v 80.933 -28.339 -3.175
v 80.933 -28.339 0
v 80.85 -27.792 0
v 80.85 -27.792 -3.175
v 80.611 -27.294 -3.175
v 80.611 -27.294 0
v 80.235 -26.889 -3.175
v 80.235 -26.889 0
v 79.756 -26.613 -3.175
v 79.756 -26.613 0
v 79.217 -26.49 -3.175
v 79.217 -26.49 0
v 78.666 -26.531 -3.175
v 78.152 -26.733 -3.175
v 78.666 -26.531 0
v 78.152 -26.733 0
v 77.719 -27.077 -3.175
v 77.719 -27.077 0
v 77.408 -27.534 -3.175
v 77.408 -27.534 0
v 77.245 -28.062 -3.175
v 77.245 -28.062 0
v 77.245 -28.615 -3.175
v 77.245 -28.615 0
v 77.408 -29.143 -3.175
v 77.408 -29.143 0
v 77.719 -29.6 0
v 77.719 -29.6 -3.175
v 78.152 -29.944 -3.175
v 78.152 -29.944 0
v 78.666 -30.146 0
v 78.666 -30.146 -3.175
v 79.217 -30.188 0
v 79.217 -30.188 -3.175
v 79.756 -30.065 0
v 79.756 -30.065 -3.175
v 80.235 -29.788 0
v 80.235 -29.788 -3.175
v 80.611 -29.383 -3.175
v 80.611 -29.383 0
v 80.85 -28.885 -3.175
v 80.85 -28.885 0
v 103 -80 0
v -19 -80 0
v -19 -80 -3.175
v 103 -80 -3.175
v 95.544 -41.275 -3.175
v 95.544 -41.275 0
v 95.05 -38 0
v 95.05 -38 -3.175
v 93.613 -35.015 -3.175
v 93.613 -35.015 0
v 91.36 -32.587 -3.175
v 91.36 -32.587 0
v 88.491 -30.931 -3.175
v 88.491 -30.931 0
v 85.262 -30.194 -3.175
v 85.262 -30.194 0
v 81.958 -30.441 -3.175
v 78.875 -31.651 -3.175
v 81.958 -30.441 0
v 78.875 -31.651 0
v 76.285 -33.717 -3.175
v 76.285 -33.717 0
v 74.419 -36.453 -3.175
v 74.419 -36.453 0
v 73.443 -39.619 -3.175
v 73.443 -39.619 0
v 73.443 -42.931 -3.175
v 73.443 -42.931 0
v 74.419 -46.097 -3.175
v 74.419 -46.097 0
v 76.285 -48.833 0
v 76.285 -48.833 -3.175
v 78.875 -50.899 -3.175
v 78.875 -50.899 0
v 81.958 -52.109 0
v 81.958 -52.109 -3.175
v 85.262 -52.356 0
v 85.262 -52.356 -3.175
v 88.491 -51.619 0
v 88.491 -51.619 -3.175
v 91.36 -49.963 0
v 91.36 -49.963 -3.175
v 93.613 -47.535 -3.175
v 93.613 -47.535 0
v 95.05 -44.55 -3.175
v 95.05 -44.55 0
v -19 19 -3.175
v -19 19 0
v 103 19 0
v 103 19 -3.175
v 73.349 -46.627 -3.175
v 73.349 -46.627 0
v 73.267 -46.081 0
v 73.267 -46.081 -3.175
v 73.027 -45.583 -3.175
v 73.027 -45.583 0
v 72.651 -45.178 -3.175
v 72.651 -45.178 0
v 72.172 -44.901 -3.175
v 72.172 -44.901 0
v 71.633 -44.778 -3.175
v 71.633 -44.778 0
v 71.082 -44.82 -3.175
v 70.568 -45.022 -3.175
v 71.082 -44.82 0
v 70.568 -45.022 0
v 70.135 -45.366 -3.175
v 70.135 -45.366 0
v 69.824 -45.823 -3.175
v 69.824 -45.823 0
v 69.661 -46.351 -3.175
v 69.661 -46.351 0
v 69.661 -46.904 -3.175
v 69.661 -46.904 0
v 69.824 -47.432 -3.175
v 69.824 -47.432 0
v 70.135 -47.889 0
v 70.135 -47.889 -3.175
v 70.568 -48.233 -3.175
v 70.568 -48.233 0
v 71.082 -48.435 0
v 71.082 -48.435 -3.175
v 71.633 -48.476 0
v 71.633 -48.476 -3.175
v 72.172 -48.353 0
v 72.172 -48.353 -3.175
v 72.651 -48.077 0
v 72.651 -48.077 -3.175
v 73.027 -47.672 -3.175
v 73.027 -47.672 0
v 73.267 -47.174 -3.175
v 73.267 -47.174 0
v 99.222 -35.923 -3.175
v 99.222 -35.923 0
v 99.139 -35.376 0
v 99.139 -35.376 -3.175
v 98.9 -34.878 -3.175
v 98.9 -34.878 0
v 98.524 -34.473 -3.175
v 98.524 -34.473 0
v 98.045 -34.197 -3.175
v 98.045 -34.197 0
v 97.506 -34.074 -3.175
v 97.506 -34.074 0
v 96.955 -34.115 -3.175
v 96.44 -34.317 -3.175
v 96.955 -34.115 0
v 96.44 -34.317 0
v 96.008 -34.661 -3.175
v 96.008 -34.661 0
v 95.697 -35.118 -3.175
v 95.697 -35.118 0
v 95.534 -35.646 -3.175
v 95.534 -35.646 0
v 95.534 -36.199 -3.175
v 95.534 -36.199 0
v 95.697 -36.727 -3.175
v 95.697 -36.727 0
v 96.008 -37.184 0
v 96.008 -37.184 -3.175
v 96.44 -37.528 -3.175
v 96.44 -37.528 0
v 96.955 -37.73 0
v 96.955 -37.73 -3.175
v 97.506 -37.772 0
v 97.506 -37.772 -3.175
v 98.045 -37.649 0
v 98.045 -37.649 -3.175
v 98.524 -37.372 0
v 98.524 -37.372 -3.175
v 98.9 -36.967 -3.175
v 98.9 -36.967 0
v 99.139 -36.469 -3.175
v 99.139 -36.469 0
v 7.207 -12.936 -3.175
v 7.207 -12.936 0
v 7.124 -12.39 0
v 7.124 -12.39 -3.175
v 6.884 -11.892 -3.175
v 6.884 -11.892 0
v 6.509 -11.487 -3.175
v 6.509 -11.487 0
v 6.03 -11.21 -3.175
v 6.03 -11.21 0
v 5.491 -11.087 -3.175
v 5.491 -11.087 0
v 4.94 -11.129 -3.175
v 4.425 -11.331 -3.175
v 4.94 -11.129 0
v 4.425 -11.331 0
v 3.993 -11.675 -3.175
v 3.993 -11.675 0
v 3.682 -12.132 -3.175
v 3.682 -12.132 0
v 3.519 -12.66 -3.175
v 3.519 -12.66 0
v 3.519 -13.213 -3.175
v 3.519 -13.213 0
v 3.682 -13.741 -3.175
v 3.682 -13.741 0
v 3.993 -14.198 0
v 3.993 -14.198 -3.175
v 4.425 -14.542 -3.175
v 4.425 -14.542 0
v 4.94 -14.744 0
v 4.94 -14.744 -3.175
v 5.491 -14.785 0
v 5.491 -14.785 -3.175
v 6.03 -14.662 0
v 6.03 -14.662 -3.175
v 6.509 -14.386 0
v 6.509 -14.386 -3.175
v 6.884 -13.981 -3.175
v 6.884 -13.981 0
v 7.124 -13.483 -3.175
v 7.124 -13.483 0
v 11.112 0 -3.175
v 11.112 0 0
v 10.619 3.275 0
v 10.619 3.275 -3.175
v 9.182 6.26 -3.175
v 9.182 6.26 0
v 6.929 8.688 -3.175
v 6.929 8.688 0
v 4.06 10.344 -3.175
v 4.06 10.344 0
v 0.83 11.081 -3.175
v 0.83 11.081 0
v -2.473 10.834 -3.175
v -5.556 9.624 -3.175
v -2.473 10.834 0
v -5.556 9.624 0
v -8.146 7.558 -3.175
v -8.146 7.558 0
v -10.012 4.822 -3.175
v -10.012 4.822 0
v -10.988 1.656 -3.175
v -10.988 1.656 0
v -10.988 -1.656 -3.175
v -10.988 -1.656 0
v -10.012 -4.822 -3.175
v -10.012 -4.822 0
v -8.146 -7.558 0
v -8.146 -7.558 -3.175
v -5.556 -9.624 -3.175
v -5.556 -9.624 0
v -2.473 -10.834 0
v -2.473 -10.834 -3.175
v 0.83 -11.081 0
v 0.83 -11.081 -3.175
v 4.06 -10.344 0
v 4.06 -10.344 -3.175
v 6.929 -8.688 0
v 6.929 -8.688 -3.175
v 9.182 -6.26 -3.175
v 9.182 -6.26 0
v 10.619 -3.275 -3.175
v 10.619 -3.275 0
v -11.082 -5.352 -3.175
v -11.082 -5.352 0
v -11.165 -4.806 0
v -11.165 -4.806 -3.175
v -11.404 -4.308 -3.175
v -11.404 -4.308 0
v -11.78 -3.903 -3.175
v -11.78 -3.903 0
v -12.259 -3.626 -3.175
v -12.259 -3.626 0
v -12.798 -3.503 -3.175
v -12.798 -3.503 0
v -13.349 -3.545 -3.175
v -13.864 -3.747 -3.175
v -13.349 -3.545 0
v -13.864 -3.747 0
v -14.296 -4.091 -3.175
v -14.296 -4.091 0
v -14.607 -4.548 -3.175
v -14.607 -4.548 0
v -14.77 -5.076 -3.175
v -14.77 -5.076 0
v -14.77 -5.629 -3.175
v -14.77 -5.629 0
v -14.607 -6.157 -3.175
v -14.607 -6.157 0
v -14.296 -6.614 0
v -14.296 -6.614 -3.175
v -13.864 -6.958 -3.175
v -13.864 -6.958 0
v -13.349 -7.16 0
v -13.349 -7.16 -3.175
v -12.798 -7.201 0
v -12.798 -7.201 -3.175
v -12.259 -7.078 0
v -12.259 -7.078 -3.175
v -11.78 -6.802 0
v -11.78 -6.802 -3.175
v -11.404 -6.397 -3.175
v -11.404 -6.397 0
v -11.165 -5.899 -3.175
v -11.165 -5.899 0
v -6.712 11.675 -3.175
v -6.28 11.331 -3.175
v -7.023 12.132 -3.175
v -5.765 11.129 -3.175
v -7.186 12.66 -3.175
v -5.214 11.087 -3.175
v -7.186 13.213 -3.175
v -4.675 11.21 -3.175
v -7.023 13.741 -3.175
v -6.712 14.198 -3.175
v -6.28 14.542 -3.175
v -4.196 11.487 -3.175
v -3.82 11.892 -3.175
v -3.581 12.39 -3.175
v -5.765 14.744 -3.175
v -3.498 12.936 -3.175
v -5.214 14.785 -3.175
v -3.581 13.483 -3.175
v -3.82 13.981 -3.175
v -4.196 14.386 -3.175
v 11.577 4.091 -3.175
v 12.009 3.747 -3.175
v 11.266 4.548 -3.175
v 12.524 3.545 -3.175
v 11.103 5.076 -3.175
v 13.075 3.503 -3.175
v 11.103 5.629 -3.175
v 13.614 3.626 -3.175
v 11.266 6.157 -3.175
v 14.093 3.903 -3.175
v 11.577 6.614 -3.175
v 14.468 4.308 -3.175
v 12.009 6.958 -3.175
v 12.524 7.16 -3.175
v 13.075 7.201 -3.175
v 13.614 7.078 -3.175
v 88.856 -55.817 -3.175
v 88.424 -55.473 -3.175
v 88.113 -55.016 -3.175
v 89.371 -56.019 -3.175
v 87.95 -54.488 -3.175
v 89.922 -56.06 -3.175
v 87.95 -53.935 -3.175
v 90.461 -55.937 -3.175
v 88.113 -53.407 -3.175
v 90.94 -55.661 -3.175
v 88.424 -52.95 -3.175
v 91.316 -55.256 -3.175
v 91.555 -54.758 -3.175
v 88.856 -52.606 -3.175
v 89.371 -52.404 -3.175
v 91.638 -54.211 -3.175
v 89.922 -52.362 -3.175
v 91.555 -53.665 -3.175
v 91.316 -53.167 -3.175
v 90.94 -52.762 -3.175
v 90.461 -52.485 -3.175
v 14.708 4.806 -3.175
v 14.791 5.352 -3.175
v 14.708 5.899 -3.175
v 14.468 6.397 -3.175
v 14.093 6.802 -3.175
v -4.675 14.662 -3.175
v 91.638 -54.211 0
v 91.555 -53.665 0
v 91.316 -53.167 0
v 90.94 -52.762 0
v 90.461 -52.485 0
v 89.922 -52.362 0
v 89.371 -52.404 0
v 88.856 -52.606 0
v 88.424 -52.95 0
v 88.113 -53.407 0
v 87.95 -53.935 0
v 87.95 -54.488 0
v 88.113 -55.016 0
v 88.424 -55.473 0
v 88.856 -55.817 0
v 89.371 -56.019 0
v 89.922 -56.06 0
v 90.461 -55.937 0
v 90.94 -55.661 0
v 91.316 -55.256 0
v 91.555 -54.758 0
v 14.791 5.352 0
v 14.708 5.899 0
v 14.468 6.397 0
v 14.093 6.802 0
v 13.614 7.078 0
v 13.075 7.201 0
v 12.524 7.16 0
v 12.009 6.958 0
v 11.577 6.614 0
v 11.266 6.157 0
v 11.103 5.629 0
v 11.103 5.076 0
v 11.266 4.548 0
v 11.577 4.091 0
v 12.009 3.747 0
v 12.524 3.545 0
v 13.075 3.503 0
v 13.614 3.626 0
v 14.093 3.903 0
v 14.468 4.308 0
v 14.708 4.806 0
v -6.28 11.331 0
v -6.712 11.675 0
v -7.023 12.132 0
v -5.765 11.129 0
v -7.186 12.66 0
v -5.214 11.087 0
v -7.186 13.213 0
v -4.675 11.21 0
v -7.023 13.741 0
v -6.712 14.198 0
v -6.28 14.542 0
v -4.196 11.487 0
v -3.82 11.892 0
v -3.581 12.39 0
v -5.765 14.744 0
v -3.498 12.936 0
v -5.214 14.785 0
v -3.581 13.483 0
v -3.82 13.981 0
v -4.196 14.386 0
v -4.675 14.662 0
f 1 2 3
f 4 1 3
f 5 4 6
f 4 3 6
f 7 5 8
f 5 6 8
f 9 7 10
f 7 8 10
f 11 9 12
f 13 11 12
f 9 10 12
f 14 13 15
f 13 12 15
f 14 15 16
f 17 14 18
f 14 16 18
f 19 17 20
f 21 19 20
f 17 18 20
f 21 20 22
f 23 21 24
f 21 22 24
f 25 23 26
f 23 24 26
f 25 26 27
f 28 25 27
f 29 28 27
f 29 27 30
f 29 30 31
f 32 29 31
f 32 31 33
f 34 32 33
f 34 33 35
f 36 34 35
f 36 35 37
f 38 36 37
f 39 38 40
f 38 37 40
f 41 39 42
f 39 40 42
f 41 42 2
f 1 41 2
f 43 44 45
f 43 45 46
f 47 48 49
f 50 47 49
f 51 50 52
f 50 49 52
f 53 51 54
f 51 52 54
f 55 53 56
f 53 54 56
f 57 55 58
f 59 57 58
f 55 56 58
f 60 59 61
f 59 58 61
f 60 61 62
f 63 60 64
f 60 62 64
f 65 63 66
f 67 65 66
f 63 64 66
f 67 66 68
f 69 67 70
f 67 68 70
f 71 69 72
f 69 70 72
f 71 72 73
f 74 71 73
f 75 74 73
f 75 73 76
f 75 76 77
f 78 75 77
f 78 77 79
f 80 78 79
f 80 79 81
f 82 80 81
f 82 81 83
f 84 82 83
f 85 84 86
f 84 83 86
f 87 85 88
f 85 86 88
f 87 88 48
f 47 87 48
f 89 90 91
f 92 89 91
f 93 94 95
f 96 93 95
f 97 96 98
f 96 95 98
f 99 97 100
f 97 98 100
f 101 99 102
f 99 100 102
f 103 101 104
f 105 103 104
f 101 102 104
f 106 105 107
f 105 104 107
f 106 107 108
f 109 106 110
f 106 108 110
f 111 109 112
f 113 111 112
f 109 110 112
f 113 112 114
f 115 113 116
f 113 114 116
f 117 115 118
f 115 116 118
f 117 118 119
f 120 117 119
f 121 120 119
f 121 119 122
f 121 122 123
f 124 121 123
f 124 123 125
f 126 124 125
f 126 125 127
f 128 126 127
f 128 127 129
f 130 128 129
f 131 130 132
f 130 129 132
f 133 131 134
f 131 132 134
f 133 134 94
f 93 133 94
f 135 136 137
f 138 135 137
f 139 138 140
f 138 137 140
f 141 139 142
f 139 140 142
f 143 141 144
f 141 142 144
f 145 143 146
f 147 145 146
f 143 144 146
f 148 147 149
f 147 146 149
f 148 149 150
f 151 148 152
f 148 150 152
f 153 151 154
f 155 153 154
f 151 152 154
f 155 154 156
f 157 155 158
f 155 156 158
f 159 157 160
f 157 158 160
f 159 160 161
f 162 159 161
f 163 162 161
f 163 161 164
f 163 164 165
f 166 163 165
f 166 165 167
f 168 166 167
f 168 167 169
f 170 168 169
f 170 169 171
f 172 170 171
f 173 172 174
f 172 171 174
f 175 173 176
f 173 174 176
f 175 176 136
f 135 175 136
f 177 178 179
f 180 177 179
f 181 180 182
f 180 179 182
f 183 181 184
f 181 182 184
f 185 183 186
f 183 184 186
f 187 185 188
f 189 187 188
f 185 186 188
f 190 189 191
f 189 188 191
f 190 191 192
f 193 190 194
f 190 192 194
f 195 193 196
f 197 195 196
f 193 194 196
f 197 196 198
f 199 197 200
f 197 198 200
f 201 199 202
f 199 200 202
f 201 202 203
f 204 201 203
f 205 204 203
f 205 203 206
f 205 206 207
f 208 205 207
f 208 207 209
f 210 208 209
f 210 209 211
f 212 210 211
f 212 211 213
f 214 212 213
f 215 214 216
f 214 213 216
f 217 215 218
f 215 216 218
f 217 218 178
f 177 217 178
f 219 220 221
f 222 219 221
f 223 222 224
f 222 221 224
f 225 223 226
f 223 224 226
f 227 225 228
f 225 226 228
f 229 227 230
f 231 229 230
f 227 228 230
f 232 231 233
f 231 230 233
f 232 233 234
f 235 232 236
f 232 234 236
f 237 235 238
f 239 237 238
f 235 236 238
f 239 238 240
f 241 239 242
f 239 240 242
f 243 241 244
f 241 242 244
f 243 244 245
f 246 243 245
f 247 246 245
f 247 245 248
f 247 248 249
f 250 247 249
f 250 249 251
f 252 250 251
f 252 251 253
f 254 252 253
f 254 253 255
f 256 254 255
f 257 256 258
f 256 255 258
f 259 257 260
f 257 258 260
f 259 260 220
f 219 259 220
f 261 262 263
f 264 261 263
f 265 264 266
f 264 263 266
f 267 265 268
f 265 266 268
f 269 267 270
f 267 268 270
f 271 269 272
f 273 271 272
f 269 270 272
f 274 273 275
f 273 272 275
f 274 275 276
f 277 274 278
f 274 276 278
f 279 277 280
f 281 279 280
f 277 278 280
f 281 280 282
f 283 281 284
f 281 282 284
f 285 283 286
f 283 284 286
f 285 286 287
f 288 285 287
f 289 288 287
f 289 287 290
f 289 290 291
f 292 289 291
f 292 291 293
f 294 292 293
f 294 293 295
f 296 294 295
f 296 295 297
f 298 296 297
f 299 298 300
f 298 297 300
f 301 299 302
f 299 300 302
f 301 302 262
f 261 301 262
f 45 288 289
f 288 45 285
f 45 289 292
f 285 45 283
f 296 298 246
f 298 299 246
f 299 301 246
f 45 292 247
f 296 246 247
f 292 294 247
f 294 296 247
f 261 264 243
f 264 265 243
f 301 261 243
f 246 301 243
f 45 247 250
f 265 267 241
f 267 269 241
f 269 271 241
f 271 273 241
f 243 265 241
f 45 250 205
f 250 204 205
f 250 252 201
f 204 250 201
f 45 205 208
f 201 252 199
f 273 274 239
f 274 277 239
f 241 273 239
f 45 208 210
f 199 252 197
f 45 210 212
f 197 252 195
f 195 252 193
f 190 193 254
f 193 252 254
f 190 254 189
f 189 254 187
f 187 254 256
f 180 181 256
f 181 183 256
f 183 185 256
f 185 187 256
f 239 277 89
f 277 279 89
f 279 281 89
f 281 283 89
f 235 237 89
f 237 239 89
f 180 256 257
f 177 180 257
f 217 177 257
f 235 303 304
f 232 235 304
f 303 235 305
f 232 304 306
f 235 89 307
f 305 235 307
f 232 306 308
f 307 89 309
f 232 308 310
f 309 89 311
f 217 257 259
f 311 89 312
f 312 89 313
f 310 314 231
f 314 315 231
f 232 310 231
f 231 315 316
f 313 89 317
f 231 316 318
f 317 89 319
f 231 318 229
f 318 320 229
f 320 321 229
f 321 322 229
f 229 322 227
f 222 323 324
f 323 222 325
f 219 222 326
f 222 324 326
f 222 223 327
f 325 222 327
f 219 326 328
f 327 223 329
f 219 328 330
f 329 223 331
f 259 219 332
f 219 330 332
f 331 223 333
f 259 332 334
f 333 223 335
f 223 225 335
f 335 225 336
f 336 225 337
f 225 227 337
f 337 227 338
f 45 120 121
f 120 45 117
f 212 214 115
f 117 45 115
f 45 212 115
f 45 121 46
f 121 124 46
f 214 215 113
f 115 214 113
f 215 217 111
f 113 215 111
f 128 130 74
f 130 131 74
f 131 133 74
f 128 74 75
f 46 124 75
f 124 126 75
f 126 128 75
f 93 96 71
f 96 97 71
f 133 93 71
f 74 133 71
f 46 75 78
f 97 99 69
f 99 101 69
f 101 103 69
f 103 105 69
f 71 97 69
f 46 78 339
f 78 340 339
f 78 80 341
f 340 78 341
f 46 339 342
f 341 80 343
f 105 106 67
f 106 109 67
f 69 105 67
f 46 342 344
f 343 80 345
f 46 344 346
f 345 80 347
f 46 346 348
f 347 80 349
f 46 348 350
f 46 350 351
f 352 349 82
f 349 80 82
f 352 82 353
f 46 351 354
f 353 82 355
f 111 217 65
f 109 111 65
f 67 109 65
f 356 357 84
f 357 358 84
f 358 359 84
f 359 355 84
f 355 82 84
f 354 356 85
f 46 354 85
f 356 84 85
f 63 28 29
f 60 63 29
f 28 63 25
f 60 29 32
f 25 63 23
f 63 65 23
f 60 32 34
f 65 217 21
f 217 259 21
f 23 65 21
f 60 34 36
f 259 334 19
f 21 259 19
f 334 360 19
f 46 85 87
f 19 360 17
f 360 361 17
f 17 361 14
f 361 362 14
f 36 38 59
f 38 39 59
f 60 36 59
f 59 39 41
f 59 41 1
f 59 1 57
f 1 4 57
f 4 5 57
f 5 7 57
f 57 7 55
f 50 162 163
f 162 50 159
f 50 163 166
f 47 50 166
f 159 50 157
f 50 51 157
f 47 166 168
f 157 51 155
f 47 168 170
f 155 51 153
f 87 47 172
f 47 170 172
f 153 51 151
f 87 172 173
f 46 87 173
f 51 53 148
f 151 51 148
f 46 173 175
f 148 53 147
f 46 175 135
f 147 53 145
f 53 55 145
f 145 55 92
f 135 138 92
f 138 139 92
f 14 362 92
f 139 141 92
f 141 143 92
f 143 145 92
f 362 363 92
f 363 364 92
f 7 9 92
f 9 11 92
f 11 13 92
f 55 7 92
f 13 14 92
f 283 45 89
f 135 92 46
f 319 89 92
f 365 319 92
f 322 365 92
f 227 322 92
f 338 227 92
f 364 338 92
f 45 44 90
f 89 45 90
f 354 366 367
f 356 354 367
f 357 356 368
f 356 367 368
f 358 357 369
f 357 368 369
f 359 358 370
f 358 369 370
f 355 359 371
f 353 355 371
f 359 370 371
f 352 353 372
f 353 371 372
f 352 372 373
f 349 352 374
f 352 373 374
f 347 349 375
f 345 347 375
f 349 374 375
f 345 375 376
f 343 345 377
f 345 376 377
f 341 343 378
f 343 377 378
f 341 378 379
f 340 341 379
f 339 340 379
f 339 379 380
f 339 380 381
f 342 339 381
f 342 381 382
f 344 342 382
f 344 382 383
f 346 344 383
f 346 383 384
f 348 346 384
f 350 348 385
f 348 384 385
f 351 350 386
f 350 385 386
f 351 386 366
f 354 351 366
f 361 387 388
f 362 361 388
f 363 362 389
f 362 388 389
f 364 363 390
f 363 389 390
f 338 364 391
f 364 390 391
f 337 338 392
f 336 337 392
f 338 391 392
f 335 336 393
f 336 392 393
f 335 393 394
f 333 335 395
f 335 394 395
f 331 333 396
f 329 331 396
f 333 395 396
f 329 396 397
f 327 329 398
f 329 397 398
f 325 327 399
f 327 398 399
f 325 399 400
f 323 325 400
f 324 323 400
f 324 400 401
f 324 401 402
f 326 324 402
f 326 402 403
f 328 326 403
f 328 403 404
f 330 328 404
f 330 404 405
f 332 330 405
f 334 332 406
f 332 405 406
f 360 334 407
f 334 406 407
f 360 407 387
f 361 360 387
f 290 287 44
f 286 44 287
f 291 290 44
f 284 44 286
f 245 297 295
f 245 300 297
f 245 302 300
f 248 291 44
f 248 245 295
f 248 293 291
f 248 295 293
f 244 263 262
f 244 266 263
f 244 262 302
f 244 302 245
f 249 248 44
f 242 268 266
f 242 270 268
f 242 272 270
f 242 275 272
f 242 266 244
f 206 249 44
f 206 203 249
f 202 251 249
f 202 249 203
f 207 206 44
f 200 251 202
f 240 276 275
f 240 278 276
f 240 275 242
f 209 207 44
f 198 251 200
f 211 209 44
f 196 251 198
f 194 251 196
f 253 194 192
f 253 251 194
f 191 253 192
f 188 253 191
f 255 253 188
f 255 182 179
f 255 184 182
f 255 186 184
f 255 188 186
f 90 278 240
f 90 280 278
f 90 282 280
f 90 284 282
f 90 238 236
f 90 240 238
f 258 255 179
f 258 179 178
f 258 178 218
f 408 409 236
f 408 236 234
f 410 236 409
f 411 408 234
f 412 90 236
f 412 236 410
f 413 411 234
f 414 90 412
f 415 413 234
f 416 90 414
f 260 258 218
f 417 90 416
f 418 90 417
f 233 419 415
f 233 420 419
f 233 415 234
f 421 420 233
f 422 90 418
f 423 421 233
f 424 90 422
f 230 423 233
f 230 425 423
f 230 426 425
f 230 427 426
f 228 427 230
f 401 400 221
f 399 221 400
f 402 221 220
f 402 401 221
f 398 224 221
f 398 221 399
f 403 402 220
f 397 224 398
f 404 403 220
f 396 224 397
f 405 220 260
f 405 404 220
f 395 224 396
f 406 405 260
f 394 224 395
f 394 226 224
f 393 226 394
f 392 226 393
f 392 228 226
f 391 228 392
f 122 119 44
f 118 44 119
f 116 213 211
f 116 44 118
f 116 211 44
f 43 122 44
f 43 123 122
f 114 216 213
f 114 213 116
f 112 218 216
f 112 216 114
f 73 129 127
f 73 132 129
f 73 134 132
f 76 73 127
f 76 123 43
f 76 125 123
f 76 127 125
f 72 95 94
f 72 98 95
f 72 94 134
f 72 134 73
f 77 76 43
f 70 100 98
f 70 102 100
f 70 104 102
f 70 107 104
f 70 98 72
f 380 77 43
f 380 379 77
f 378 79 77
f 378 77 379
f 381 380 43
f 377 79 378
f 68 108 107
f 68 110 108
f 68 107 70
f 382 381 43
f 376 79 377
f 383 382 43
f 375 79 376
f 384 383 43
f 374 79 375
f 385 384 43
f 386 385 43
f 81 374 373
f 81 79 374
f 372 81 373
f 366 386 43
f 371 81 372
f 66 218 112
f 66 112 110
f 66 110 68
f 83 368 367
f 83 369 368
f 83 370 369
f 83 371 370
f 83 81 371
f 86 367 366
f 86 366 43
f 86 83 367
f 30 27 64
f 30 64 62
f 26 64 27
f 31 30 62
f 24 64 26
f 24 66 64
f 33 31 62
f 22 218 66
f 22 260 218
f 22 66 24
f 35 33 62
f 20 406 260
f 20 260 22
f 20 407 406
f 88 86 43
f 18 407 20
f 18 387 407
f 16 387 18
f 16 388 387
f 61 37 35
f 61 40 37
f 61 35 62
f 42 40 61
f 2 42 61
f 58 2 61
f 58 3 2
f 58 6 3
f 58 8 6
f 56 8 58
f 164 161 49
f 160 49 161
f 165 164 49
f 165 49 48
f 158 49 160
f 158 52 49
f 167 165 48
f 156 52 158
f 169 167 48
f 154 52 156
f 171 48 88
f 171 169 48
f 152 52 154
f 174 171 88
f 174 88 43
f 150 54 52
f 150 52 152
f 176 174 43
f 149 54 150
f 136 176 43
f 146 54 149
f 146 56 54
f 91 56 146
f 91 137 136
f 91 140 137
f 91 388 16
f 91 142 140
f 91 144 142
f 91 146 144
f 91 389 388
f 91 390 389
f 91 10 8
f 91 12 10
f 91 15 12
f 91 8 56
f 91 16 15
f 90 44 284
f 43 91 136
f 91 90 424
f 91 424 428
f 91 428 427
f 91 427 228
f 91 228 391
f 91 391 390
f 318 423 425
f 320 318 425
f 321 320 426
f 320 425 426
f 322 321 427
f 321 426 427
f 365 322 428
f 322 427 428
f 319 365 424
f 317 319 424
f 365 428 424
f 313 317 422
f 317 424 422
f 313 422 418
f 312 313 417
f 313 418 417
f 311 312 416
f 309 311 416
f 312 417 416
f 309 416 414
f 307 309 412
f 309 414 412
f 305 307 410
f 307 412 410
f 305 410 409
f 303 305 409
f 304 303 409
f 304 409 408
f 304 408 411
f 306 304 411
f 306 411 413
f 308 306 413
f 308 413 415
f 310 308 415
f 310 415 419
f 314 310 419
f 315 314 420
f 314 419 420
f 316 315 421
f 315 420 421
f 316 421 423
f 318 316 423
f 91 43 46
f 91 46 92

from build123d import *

# Parameters (mm, degrees)
SKETCH1_W           = 122
SKETCH1_H           = 99
SKETCH1_R           = 11.1125
SKETCH1_R_2         = 1.8542
BOSS_EXTRUDE1_DEPTH = 3.175


with BuildPart() as part:
    # Sketch1 → Boss-Extrude1 (new body)
    with BuildSketch(Plane.XY):
        with Locations((42, -30.5)):
            Rectangle(SKETCH1_W, SKETCH1_H)
        Circle(SKETCH1_R, mode=Mode.SUBTRACT)
        with Locations((-5.352449154, 12.936432586)):
            Circle(SKETCH1_R_2, mode=Mode.SUBTRACT)
        with Locations((-12.936432586, -5.352449154)):
            Circle(SKETCH1_R_2, mode=Mode.SUBTRACT)
        with Locations((12.936432586, 5.352449154)):
            Circle(SKETCH1_R_2, mode=Mode.SUBTRACT)
        with Locations((5.352449154, -12.936432586)):
            Circle(SKETCH1_R_2, mode=Mode.SUBTRACT)
        with Locations((84.431124445, -41.275)):
            Circle(SKETCH1_R, mode=Mode.SUBTRACT)
        with Locations((79.07867529, -28.338567414)):
            Circle(SKETCH1_R_2, mode=Mode.SUBTRACT)
        with Locations((71.494691859, -46.627449154)):
            Circle(SKETCH1_R_2, mode=Mode.SUBTRACT)
        with Locations((89.783573599, -54.211432586)):
            Circle(SKETCH1_R_2, mode=Mode.SUBTRACT)
        with Locations((97.367557031, -35.922550846)):
            Circle(SKETCH1_R_2, mode=Mode.SUBTRACT)
    extrude(amount=-BOSS_EXTRUDE1_DEPTH)


solid = part.part
